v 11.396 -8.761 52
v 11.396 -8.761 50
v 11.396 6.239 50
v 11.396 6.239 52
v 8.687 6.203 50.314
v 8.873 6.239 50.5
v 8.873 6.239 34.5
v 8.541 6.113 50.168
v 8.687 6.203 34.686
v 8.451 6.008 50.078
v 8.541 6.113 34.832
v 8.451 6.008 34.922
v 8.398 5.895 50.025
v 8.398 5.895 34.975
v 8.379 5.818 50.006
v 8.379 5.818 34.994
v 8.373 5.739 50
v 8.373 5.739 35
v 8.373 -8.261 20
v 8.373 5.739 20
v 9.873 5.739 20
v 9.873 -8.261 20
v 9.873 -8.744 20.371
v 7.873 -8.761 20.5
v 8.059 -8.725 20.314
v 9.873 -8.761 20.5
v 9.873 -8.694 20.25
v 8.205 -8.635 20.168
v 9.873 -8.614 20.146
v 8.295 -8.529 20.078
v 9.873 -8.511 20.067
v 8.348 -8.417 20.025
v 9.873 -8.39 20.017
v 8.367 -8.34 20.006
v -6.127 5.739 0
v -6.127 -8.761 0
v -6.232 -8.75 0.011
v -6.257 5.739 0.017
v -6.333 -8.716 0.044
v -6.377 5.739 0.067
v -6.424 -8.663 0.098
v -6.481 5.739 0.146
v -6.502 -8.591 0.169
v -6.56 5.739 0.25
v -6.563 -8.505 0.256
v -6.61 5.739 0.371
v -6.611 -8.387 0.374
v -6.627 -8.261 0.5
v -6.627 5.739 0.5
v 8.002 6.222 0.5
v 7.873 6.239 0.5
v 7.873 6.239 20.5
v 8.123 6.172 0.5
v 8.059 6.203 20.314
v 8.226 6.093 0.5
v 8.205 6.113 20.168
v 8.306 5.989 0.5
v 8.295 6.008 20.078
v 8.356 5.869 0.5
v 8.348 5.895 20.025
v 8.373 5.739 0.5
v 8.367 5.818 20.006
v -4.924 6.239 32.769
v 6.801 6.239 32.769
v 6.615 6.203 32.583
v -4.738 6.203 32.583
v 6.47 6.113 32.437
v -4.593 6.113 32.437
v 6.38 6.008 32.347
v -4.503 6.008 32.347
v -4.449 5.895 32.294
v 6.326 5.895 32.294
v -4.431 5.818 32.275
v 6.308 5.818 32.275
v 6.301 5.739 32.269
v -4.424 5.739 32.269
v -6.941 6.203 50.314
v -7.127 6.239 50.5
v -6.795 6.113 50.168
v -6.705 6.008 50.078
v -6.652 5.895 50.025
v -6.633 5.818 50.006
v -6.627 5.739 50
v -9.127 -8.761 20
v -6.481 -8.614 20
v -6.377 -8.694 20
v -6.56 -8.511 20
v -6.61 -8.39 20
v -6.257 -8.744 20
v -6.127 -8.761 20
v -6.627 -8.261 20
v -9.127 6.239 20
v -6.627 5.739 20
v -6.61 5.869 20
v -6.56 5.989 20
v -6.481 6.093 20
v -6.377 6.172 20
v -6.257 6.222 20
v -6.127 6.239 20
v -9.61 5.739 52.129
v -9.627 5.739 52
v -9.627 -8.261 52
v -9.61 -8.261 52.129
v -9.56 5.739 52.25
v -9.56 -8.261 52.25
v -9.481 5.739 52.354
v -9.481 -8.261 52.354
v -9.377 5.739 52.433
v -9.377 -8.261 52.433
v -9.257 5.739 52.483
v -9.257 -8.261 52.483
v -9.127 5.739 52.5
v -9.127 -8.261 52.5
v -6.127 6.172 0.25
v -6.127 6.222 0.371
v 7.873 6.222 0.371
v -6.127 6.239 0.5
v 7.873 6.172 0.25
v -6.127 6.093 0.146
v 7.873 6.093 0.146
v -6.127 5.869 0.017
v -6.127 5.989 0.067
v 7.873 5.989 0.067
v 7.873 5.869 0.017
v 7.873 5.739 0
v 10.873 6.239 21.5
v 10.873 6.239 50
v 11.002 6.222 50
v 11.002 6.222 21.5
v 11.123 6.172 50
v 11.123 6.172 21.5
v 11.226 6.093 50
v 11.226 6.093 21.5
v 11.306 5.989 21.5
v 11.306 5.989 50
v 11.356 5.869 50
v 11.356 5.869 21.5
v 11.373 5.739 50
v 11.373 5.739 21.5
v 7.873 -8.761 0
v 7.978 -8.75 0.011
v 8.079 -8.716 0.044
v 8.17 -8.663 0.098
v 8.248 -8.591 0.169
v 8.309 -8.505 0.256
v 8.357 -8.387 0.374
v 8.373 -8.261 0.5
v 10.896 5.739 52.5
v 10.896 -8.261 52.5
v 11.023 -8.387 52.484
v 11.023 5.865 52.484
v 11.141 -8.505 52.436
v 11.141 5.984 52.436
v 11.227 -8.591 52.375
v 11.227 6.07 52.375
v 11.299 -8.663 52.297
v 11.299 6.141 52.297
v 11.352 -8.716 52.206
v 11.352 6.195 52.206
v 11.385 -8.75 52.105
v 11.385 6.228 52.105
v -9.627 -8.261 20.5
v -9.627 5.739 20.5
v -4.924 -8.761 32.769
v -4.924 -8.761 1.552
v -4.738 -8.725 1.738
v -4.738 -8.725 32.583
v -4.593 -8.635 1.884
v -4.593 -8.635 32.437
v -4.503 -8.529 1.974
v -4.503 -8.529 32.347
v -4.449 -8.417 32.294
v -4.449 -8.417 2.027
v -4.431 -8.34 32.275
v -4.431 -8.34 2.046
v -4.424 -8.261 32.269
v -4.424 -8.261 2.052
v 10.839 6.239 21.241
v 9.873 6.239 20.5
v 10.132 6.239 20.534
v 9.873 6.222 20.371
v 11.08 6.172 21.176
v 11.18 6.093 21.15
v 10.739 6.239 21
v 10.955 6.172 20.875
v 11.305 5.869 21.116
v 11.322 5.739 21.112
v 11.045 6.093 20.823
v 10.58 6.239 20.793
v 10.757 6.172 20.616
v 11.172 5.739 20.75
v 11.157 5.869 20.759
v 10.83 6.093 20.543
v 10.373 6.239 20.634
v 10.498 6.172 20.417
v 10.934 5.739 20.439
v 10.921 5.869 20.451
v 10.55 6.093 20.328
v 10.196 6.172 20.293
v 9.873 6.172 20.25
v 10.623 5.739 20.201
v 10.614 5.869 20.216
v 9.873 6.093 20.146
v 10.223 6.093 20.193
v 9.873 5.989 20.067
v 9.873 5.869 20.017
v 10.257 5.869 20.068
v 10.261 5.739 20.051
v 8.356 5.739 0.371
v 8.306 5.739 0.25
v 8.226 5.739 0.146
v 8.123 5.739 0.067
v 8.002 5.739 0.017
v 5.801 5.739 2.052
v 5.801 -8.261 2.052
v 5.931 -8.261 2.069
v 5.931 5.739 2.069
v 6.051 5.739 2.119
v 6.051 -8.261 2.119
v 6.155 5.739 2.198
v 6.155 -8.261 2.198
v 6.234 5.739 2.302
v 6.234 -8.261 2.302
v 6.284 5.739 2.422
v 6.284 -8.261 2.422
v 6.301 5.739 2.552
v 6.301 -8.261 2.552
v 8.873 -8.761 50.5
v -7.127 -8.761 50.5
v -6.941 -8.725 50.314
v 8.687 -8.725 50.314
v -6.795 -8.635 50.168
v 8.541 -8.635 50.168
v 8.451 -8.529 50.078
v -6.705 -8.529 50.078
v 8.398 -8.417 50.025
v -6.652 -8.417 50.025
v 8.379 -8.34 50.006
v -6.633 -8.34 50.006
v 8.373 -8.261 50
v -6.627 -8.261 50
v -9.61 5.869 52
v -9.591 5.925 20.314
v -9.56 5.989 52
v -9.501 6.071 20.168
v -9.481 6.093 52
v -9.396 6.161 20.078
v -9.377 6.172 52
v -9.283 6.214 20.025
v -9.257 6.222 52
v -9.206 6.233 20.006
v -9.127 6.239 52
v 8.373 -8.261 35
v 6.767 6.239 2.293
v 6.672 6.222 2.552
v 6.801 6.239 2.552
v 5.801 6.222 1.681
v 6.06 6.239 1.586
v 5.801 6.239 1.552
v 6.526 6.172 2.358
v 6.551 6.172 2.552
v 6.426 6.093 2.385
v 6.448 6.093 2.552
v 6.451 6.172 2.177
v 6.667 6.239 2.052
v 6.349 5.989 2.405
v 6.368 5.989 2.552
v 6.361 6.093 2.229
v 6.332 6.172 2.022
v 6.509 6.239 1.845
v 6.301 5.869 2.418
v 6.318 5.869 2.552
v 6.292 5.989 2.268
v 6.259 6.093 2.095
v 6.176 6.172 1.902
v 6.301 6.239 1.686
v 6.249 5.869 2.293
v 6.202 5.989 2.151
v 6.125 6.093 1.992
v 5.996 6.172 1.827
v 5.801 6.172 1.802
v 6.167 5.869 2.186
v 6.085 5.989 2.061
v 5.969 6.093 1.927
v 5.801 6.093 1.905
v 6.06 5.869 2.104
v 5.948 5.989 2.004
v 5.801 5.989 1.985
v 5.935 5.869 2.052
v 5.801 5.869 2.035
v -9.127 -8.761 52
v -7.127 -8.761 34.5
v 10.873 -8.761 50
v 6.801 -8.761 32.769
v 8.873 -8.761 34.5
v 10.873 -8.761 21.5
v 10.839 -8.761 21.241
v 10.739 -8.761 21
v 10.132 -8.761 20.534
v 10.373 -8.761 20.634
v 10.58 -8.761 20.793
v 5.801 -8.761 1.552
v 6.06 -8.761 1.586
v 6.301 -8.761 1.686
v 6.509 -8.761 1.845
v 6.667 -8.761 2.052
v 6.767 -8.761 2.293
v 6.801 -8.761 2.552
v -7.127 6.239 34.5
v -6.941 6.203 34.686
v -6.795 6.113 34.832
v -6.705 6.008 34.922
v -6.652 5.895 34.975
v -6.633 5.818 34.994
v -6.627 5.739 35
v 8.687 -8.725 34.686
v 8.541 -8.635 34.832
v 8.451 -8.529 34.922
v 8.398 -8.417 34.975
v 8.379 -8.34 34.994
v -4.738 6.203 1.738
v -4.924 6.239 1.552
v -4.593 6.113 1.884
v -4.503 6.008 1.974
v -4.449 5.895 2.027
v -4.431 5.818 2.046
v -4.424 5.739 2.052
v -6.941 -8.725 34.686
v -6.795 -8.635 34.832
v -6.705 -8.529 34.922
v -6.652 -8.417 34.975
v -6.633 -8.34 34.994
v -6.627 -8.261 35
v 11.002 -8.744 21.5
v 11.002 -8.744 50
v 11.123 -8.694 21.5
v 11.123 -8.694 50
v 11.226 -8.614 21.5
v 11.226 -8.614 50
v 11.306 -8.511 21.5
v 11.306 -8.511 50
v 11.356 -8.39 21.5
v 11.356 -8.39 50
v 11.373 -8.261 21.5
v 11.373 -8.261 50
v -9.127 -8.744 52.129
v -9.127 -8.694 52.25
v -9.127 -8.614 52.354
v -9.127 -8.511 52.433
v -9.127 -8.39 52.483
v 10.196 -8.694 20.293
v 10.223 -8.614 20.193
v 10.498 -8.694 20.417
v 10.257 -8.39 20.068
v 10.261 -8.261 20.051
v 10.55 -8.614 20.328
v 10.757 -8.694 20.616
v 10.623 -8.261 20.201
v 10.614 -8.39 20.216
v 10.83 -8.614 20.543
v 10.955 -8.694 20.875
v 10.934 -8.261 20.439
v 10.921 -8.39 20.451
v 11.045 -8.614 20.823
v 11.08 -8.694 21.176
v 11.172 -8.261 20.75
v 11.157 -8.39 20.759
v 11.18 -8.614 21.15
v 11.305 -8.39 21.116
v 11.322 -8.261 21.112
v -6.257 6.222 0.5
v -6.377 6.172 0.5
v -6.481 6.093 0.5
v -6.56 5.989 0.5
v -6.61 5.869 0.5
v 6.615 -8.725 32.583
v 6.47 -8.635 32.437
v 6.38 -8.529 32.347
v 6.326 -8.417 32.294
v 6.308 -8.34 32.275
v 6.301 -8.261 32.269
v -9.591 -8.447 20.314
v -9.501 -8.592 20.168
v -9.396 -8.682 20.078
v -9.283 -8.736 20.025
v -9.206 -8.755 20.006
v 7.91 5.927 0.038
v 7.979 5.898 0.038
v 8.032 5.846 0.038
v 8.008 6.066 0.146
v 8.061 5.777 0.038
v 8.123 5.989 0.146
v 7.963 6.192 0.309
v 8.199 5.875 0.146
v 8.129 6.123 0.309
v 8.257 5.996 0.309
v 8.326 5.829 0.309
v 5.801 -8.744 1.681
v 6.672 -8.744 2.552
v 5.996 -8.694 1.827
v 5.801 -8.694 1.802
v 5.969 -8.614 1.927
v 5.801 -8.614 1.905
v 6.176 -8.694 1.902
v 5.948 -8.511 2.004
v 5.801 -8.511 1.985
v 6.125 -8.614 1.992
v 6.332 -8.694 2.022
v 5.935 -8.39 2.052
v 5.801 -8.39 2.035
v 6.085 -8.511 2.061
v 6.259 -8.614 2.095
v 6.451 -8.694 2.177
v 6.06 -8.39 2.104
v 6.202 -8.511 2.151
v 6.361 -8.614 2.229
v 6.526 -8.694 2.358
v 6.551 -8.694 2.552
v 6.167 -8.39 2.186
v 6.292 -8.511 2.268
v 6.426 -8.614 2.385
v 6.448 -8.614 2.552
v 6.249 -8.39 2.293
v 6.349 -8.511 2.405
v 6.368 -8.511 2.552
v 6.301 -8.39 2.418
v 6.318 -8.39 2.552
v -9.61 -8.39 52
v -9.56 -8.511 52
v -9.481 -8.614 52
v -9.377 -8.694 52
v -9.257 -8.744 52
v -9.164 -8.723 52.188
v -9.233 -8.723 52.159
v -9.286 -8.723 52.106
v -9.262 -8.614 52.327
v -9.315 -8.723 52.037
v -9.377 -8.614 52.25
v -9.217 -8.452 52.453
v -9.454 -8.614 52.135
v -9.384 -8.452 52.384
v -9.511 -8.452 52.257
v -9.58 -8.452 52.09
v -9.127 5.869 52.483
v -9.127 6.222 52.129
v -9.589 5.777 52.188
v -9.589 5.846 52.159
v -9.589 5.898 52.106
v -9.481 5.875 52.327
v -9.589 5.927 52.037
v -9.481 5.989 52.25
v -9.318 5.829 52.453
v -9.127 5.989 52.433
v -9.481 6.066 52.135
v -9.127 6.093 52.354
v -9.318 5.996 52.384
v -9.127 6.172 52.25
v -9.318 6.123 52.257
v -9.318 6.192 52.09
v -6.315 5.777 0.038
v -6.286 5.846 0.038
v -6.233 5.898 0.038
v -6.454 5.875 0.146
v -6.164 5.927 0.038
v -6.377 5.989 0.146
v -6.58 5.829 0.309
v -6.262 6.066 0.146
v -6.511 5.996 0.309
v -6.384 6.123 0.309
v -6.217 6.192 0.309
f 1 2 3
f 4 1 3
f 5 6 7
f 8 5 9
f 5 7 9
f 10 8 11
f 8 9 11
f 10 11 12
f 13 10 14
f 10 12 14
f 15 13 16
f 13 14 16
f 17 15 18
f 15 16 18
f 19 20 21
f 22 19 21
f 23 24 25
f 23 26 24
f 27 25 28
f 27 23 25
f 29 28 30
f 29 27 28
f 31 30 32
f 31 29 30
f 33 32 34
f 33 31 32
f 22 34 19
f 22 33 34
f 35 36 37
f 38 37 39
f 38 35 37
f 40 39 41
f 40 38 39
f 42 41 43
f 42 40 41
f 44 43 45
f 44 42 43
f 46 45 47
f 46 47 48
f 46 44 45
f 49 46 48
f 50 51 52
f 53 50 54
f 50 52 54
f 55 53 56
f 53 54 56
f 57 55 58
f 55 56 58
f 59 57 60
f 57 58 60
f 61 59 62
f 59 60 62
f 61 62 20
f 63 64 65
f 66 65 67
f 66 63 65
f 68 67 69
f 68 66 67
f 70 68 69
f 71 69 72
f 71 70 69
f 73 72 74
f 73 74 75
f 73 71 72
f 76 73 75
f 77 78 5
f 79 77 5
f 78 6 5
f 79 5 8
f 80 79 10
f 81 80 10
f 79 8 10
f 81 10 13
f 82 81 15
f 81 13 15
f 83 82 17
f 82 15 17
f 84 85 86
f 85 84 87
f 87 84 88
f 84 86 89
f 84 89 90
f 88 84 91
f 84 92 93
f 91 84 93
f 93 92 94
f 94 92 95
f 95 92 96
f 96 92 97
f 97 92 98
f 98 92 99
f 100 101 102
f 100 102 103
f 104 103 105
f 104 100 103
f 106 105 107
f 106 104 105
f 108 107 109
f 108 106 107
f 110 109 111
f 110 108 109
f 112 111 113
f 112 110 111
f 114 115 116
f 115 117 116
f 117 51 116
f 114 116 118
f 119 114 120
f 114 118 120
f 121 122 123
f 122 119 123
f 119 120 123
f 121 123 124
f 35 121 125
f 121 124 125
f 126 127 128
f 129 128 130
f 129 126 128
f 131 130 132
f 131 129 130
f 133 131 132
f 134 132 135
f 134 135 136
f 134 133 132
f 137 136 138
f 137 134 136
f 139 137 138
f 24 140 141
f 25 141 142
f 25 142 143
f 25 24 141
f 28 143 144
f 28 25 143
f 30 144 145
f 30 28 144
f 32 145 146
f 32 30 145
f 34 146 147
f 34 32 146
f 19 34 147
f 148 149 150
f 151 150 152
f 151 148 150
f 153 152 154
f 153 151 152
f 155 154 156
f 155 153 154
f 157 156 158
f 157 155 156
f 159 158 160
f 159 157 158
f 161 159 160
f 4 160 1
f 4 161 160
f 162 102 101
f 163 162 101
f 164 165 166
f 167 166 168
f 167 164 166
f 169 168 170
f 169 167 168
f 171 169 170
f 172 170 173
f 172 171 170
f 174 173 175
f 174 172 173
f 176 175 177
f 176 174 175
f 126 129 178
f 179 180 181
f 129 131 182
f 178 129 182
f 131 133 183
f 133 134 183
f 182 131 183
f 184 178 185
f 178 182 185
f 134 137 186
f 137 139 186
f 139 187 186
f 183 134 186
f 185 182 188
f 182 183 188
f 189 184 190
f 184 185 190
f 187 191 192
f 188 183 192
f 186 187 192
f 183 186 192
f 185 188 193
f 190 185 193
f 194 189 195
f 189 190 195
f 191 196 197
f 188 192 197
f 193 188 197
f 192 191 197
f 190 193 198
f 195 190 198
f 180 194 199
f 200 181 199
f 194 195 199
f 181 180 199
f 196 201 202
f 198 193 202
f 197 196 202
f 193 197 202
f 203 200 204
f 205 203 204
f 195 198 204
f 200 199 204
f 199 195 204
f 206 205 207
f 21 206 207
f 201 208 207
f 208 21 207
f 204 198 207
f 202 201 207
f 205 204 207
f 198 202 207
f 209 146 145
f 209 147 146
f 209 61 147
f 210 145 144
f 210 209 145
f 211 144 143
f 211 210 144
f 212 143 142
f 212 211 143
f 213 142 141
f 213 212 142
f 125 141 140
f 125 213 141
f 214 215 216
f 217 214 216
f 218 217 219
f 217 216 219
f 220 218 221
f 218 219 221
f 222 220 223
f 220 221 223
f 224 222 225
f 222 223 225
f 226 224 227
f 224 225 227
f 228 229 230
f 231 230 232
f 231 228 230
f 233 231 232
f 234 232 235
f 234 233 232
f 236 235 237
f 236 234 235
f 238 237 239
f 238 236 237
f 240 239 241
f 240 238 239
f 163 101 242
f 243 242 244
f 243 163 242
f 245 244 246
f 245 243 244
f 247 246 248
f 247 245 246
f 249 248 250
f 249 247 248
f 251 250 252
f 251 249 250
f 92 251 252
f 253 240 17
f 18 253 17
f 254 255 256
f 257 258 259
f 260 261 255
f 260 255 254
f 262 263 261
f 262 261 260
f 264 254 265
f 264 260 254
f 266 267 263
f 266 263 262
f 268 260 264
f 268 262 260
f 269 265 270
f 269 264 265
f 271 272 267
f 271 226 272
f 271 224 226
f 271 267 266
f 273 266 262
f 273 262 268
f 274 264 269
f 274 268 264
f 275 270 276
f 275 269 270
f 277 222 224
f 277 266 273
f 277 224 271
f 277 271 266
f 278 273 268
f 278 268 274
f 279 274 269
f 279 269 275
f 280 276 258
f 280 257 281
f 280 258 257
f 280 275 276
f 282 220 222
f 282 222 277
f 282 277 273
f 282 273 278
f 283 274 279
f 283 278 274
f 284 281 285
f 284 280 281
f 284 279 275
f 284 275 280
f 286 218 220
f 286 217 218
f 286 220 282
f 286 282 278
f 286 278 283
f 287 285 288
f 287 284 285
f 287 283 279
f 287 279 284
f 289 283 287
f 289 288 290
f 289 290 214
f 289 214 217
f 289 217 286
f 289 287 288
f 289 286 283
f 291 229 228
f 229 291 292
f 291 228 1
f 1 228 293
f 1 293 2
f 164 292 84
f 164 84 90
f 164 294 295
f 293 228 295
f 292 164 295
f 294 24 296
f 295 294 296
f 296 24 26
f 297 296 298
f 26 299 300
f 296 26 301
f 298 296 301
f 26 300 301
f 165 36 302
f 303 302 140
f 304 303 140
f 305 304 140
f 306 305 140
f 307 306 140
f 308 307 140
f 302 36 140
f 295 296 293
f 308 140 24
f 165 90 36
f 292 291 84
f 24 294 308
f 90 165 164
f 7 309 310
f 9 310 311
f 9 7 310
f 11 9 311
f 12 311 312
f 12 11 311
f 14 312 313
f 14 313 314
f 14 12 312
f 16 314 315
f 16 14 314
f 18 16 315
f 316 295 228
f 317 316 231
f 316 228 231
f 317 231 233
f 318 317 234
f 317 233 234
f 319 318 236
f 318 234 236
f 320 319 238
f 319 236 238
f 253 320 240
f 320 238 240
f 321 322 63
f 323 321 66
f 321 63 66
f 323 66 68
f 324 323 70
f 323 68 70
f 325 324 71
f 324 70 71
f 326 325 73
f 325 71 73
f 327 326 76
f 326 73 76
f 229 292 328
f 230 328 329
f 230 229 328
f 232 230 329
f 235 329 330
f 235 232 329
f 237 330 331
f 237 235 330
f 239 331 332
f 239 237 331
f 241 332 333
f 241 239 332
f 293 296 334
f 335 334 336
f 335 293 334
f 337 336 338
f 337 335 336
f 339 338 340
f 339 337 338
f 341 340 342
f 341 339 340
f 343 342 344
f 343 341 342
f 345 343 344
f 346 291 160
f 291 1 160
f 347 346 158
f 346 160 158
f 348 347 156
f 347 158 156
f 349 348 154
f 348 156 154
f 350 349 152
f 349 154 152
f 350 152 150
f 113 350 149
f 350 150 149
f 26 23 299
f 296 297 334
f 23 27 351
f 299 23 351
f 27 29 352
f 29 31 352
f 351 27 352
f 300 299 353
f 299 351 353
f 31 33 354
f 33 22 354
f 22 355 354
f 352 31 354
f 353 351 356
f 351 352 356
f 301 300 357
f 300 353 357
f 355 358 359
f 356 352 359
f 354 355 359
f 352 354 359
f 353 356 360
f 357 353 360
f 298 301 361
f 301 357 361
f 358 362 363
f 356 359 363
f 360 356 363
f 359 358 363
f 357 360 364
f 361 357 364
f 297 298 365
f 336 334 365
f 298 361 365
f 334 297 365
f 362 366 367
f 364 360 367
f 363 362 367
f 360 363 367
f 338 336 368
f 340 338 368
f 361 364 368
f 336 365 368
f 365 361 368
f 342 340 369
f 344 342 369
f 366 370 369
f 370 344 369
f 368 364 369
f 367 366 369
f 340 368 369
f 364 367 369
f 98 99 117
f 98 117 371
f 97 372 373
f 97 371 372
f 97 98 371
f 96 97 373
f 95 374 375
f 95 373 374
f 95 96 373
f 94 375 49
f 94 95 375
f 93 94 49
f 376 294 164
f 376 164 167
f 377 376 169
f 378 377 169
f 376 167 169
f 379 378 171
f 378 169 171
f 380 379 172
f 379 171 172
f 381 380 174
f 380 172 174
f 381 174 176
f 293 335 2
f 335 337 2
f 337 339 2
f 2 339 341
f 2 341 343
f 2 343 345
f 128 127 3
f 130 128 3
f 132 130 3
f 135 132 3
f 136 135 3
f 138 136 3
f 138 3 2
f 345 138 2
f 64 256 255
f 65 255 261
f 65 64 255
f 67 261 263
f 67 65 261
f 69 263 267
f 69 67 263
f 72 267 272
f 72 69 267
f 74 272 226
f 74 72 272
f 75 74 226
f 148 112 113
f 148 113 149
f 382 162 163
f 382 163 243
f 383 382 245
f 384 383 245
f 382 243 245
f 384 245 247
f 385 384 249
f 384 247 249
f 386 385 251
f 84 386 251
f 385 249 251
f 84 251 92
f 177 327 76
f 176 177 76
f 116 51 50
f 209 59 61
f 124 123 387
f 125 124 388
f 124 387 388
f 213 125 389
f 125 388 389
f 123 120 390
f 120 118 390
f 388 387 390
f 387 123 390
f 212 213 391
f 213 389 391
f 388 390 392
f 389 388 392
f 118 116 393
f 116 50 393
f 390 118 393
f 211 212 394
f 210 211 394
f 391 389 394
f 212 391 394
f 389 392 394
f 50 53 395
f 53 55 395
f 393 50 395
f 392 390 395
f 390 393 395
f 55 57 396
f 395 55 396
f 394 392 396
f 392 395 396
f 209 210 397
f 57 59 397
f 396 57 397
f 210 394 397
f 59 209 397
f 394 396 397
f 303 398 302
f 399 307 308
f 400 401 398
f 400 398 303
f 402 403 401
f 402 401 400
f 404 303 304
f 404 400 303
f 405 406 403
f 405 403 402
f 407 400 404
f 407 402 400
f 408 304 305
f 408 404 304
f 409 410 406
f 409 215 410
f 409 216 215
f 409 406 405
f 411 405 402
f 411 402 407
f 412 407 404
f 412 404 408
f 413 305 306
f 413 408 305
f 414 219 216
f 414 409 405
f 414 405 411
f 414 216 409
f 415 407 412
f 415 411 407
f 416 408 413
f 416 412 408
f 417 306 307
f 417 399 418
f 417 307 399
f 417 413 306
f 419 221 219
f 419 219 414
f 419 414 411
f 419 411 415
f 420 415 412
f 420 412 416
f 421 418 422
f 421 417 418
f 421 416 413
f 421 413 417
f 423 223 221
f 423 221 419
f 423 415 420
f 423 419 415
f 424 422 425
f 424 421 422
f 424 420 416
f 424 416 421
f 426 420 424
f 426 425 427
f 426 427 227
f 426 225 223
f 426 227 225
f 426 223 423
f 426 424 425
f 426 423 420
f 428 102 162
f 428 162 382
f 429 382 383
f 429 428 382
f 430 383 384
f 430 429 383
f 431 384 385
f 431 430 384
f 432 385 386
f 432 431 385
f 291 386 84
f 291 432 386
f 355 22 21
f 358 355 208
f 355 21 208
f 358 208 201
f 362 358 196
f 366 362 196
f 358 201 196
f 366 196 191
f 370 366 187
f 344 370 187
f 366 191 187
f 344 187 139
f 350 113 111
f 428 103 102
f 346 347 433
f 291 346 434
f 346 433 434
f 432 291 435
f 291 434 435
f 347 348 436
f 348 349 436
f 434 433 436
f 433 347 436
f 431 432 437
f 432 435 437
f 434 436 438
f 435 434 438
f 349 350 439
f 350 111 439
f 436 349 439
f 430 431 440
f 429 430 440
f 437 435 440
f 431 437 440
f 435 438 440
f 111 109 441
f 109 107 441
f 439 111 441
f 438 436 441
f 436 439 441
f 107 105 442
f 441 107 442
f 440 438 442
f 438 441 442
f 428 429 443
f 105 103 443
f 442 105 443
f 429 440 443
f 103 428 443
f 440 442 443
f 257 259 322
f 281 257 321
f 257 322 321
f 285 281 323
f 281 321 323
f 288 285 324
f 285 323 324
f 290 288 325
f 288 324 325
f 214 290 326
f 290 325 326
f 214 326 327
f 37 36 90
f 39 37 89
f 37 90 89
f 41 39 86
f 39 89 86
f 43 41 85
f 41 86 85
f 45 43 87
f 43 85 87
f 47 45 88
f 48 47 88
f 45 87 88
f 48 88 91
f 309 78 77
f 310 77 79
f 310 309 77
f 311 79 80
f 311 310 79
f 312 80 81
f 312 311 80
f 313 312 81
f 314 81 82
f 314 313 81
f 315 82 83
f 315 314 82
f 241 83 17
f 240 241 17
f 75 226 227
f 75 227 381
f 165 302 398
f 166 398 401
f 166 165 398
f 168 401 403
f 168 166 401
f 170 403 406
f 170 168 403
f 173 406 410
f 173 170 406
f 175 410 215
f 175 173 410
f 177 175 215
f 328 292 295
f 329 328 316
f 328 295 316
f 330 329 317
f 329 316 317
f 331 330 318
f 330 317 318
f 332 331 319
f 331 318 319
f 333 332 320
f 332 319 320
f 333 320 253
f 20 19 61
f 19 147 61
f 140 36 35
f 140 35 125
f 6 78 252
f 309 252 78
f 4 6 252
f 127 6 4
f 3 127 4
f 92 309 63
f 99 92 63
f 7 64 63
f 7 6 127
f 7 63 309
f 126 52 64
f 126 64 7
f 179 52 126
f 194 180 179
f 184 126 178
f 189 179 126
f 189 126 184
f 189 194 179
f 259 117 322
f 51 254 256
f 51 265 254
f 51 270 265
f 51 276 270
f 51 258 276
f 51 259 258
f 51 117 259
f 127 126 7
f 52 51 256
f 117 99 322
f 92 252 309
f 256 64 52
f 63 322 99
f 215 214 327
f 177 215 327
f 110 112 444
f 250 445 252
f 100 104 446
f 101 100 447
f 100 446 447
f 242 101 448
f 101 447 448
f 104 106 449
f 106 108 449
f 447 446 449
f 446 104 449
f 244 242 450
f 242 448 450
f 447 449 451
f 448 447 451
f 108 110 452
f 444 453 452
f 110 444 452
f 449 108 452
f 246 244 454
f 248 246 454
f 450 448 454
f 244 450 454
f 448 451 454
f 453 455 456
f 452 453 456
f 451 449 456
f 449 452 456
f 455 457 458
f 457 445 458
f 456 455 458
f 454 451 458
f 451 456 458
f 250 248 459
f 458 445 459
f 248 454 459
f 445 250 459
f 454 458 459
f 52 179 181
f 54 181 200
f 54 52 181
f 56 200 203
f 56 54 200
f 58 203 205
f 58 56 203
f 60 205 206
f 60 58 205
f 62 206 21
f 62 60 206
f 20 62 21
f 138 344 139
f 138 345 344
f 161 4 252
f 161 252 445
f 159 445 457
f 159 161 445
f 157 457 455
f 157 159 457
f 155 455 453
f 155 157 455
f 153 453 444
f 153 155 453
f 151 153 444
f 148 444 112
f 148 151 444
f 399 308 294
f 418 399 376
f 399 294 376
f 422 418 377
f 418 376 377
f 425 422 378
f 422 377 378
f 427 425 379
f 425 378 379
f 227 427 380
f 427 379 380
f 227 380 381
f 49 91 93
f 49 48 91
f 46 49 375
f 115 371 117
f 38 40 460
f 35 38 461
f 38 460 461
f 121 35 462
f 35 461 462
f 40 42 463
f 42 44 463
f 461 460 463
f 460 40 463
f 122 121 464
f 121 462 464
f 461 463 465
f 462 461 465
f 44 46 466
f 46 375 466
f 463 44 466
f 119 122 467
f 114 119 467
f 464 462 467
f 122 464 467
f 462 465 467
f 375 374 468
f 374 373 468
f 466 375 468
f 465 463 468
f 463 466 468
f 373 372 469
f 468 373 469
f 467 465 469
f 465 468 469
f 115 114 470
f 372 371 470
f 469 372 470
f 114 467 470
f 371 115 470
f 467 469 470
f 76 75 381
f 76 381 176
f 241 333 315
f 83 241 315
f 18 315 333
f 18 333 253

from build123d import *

# Parameters (mm, degrees)
F0_W     = 15
F0_H     = 15
F1_DEPTH = 35
F2_W     = 3
F2_H     = 15
F3_DEPTH = 15
F4_R     = 1.5
F5_W     = 21.0236056261
F5_H     = 15
F6_DEPTH = 2.5
F7_R     = 0.5
F8_W     = 10.7259307988
F8_H     = 30.2171390504
F9_DEPTH = 25
F10_R    = 0.5
F11_R    = 0.5


with BuildPart() as f1:
    # F0 (on Top) → F1 (new body)
    with BuildSketch(Plane.XY):
        with Locations((0.8728443645, -1.2607762389)):
            Rectangle(F0_W, F0_H)
    extrude(amount=F1_DEPTH)

    # F2 (on face) → F3 (join, symmetric)
    with BuildSketch(Plane.XY.offset(35)):
        with Locations((-8.1271556355, -1.2607762389)):
            Rectangle(F2_W, F2_H)
        with Locations((9.8728443645, -1.2607762389)):
            Rectangle(F2_W, F2_H)
    extrude(amount=F3_DEPTH, both=True)

    # F4
    f4_edges = [f1.edges().sort_by_distance(p)[0] for p in [
        (11.372844, -1.260776, 20),
    ]]
    fillet(f4_edges, radius=F4_R)

    # F5 (on face) → F6 (join)
    with BuildSketch(Plane.XY.offset(50)):
        with Locations((0.8846471775, -1.2607762389)):
            Rectangle(F5_W, F5_H)
    extrude(amount=F6_DEPTH)

    # F7
    f7_edges = [f1.edges().sort_by_distance(p)[0] for p in [
        (0.884647, 6.239224, 52.5),
        (-9.627156, -1.260776, 52.5),
        (0.884647, -8.760776, 52.5),
        (11.39645, -1.260776, 52.5),
        (-9.627156, 6.239224, 36.25),
        (-9.627156, -8.760776, 36.25),
        (11.372844, 6.239224, 35.75),
        (0.872844, 6.239224, 35),
        (8.372844, 6.239224, 42.5),
        (0.872844, 6.239224, 50),
        (-6.627156, 6.239224, 42.5),
        (-6.627156, -8.760776, 10),
        (-9.627156, -1.260776, 20),
        (-6.627156, 6.239224, 10),
        (-6.627156, -1.260776, 0),
        (8.372844, 6.239224, 10),
        (0.872844, 6.239224, 0),
        (11.372844, -8.760776, 35.75),
        (8.372844, -8.760776, 10),
        (8.372844, -1.260776, 0),
        (11.372844, -1.260776, 21.5),
    ]]
    fillet(f7_edges, radius=F7_R)

    # F8 (on face) → F9 (cut)
    with BuildSketch(Plane(origin=(0, 6.2392237611, 0), x_dir=(-1, 0, 0), z_dir=(0, 1, 0))):
        with Locations((-0.938487472, 17.1604724601)):
            Rectangle(F8_W, F8_H)
    extrude(amount=-F9_DEPTH, mode=Mode.SUBTRACT)

    # F10
    f10_edges = [f1.edges().sort_by_distance(p)[0] for p in [
        (6.301453, 6.239224, 17.160472),
        (6.301453, -8.760776, 17.160472),
        (0.938487, 6.239224, 2.051903),
        (6.301453, -1.260776, 2.051903),
        (0.938487, -8.760776, 32.269042),
        (-4.424478, -8.760776, 17.160472),
        (0.938487, -8.760776, 2.051903),
        (-6.127156, -8.760776, 10),
        (-6.127156, -1.510776, 0),
        (-4.424478, 6.239224, 17.160472),
        (0.938487, 6.239224, 32.269042),
    ]]
    fillet(f10_edges, radius=F10_R)

    # F11
    f11_edges = [f1.edges().sort_by_distance(p)[0] for p in [
        (0.872844, -8.760776, 50),
        (-6.627156, -8.760776, 42.5),
        (0.872844, -8.760776, 35),
        (8.372844, -8.760776, 42.5),
    ]]
    fillet(f11_edges, radius=F11_R)


solid = f1.part
